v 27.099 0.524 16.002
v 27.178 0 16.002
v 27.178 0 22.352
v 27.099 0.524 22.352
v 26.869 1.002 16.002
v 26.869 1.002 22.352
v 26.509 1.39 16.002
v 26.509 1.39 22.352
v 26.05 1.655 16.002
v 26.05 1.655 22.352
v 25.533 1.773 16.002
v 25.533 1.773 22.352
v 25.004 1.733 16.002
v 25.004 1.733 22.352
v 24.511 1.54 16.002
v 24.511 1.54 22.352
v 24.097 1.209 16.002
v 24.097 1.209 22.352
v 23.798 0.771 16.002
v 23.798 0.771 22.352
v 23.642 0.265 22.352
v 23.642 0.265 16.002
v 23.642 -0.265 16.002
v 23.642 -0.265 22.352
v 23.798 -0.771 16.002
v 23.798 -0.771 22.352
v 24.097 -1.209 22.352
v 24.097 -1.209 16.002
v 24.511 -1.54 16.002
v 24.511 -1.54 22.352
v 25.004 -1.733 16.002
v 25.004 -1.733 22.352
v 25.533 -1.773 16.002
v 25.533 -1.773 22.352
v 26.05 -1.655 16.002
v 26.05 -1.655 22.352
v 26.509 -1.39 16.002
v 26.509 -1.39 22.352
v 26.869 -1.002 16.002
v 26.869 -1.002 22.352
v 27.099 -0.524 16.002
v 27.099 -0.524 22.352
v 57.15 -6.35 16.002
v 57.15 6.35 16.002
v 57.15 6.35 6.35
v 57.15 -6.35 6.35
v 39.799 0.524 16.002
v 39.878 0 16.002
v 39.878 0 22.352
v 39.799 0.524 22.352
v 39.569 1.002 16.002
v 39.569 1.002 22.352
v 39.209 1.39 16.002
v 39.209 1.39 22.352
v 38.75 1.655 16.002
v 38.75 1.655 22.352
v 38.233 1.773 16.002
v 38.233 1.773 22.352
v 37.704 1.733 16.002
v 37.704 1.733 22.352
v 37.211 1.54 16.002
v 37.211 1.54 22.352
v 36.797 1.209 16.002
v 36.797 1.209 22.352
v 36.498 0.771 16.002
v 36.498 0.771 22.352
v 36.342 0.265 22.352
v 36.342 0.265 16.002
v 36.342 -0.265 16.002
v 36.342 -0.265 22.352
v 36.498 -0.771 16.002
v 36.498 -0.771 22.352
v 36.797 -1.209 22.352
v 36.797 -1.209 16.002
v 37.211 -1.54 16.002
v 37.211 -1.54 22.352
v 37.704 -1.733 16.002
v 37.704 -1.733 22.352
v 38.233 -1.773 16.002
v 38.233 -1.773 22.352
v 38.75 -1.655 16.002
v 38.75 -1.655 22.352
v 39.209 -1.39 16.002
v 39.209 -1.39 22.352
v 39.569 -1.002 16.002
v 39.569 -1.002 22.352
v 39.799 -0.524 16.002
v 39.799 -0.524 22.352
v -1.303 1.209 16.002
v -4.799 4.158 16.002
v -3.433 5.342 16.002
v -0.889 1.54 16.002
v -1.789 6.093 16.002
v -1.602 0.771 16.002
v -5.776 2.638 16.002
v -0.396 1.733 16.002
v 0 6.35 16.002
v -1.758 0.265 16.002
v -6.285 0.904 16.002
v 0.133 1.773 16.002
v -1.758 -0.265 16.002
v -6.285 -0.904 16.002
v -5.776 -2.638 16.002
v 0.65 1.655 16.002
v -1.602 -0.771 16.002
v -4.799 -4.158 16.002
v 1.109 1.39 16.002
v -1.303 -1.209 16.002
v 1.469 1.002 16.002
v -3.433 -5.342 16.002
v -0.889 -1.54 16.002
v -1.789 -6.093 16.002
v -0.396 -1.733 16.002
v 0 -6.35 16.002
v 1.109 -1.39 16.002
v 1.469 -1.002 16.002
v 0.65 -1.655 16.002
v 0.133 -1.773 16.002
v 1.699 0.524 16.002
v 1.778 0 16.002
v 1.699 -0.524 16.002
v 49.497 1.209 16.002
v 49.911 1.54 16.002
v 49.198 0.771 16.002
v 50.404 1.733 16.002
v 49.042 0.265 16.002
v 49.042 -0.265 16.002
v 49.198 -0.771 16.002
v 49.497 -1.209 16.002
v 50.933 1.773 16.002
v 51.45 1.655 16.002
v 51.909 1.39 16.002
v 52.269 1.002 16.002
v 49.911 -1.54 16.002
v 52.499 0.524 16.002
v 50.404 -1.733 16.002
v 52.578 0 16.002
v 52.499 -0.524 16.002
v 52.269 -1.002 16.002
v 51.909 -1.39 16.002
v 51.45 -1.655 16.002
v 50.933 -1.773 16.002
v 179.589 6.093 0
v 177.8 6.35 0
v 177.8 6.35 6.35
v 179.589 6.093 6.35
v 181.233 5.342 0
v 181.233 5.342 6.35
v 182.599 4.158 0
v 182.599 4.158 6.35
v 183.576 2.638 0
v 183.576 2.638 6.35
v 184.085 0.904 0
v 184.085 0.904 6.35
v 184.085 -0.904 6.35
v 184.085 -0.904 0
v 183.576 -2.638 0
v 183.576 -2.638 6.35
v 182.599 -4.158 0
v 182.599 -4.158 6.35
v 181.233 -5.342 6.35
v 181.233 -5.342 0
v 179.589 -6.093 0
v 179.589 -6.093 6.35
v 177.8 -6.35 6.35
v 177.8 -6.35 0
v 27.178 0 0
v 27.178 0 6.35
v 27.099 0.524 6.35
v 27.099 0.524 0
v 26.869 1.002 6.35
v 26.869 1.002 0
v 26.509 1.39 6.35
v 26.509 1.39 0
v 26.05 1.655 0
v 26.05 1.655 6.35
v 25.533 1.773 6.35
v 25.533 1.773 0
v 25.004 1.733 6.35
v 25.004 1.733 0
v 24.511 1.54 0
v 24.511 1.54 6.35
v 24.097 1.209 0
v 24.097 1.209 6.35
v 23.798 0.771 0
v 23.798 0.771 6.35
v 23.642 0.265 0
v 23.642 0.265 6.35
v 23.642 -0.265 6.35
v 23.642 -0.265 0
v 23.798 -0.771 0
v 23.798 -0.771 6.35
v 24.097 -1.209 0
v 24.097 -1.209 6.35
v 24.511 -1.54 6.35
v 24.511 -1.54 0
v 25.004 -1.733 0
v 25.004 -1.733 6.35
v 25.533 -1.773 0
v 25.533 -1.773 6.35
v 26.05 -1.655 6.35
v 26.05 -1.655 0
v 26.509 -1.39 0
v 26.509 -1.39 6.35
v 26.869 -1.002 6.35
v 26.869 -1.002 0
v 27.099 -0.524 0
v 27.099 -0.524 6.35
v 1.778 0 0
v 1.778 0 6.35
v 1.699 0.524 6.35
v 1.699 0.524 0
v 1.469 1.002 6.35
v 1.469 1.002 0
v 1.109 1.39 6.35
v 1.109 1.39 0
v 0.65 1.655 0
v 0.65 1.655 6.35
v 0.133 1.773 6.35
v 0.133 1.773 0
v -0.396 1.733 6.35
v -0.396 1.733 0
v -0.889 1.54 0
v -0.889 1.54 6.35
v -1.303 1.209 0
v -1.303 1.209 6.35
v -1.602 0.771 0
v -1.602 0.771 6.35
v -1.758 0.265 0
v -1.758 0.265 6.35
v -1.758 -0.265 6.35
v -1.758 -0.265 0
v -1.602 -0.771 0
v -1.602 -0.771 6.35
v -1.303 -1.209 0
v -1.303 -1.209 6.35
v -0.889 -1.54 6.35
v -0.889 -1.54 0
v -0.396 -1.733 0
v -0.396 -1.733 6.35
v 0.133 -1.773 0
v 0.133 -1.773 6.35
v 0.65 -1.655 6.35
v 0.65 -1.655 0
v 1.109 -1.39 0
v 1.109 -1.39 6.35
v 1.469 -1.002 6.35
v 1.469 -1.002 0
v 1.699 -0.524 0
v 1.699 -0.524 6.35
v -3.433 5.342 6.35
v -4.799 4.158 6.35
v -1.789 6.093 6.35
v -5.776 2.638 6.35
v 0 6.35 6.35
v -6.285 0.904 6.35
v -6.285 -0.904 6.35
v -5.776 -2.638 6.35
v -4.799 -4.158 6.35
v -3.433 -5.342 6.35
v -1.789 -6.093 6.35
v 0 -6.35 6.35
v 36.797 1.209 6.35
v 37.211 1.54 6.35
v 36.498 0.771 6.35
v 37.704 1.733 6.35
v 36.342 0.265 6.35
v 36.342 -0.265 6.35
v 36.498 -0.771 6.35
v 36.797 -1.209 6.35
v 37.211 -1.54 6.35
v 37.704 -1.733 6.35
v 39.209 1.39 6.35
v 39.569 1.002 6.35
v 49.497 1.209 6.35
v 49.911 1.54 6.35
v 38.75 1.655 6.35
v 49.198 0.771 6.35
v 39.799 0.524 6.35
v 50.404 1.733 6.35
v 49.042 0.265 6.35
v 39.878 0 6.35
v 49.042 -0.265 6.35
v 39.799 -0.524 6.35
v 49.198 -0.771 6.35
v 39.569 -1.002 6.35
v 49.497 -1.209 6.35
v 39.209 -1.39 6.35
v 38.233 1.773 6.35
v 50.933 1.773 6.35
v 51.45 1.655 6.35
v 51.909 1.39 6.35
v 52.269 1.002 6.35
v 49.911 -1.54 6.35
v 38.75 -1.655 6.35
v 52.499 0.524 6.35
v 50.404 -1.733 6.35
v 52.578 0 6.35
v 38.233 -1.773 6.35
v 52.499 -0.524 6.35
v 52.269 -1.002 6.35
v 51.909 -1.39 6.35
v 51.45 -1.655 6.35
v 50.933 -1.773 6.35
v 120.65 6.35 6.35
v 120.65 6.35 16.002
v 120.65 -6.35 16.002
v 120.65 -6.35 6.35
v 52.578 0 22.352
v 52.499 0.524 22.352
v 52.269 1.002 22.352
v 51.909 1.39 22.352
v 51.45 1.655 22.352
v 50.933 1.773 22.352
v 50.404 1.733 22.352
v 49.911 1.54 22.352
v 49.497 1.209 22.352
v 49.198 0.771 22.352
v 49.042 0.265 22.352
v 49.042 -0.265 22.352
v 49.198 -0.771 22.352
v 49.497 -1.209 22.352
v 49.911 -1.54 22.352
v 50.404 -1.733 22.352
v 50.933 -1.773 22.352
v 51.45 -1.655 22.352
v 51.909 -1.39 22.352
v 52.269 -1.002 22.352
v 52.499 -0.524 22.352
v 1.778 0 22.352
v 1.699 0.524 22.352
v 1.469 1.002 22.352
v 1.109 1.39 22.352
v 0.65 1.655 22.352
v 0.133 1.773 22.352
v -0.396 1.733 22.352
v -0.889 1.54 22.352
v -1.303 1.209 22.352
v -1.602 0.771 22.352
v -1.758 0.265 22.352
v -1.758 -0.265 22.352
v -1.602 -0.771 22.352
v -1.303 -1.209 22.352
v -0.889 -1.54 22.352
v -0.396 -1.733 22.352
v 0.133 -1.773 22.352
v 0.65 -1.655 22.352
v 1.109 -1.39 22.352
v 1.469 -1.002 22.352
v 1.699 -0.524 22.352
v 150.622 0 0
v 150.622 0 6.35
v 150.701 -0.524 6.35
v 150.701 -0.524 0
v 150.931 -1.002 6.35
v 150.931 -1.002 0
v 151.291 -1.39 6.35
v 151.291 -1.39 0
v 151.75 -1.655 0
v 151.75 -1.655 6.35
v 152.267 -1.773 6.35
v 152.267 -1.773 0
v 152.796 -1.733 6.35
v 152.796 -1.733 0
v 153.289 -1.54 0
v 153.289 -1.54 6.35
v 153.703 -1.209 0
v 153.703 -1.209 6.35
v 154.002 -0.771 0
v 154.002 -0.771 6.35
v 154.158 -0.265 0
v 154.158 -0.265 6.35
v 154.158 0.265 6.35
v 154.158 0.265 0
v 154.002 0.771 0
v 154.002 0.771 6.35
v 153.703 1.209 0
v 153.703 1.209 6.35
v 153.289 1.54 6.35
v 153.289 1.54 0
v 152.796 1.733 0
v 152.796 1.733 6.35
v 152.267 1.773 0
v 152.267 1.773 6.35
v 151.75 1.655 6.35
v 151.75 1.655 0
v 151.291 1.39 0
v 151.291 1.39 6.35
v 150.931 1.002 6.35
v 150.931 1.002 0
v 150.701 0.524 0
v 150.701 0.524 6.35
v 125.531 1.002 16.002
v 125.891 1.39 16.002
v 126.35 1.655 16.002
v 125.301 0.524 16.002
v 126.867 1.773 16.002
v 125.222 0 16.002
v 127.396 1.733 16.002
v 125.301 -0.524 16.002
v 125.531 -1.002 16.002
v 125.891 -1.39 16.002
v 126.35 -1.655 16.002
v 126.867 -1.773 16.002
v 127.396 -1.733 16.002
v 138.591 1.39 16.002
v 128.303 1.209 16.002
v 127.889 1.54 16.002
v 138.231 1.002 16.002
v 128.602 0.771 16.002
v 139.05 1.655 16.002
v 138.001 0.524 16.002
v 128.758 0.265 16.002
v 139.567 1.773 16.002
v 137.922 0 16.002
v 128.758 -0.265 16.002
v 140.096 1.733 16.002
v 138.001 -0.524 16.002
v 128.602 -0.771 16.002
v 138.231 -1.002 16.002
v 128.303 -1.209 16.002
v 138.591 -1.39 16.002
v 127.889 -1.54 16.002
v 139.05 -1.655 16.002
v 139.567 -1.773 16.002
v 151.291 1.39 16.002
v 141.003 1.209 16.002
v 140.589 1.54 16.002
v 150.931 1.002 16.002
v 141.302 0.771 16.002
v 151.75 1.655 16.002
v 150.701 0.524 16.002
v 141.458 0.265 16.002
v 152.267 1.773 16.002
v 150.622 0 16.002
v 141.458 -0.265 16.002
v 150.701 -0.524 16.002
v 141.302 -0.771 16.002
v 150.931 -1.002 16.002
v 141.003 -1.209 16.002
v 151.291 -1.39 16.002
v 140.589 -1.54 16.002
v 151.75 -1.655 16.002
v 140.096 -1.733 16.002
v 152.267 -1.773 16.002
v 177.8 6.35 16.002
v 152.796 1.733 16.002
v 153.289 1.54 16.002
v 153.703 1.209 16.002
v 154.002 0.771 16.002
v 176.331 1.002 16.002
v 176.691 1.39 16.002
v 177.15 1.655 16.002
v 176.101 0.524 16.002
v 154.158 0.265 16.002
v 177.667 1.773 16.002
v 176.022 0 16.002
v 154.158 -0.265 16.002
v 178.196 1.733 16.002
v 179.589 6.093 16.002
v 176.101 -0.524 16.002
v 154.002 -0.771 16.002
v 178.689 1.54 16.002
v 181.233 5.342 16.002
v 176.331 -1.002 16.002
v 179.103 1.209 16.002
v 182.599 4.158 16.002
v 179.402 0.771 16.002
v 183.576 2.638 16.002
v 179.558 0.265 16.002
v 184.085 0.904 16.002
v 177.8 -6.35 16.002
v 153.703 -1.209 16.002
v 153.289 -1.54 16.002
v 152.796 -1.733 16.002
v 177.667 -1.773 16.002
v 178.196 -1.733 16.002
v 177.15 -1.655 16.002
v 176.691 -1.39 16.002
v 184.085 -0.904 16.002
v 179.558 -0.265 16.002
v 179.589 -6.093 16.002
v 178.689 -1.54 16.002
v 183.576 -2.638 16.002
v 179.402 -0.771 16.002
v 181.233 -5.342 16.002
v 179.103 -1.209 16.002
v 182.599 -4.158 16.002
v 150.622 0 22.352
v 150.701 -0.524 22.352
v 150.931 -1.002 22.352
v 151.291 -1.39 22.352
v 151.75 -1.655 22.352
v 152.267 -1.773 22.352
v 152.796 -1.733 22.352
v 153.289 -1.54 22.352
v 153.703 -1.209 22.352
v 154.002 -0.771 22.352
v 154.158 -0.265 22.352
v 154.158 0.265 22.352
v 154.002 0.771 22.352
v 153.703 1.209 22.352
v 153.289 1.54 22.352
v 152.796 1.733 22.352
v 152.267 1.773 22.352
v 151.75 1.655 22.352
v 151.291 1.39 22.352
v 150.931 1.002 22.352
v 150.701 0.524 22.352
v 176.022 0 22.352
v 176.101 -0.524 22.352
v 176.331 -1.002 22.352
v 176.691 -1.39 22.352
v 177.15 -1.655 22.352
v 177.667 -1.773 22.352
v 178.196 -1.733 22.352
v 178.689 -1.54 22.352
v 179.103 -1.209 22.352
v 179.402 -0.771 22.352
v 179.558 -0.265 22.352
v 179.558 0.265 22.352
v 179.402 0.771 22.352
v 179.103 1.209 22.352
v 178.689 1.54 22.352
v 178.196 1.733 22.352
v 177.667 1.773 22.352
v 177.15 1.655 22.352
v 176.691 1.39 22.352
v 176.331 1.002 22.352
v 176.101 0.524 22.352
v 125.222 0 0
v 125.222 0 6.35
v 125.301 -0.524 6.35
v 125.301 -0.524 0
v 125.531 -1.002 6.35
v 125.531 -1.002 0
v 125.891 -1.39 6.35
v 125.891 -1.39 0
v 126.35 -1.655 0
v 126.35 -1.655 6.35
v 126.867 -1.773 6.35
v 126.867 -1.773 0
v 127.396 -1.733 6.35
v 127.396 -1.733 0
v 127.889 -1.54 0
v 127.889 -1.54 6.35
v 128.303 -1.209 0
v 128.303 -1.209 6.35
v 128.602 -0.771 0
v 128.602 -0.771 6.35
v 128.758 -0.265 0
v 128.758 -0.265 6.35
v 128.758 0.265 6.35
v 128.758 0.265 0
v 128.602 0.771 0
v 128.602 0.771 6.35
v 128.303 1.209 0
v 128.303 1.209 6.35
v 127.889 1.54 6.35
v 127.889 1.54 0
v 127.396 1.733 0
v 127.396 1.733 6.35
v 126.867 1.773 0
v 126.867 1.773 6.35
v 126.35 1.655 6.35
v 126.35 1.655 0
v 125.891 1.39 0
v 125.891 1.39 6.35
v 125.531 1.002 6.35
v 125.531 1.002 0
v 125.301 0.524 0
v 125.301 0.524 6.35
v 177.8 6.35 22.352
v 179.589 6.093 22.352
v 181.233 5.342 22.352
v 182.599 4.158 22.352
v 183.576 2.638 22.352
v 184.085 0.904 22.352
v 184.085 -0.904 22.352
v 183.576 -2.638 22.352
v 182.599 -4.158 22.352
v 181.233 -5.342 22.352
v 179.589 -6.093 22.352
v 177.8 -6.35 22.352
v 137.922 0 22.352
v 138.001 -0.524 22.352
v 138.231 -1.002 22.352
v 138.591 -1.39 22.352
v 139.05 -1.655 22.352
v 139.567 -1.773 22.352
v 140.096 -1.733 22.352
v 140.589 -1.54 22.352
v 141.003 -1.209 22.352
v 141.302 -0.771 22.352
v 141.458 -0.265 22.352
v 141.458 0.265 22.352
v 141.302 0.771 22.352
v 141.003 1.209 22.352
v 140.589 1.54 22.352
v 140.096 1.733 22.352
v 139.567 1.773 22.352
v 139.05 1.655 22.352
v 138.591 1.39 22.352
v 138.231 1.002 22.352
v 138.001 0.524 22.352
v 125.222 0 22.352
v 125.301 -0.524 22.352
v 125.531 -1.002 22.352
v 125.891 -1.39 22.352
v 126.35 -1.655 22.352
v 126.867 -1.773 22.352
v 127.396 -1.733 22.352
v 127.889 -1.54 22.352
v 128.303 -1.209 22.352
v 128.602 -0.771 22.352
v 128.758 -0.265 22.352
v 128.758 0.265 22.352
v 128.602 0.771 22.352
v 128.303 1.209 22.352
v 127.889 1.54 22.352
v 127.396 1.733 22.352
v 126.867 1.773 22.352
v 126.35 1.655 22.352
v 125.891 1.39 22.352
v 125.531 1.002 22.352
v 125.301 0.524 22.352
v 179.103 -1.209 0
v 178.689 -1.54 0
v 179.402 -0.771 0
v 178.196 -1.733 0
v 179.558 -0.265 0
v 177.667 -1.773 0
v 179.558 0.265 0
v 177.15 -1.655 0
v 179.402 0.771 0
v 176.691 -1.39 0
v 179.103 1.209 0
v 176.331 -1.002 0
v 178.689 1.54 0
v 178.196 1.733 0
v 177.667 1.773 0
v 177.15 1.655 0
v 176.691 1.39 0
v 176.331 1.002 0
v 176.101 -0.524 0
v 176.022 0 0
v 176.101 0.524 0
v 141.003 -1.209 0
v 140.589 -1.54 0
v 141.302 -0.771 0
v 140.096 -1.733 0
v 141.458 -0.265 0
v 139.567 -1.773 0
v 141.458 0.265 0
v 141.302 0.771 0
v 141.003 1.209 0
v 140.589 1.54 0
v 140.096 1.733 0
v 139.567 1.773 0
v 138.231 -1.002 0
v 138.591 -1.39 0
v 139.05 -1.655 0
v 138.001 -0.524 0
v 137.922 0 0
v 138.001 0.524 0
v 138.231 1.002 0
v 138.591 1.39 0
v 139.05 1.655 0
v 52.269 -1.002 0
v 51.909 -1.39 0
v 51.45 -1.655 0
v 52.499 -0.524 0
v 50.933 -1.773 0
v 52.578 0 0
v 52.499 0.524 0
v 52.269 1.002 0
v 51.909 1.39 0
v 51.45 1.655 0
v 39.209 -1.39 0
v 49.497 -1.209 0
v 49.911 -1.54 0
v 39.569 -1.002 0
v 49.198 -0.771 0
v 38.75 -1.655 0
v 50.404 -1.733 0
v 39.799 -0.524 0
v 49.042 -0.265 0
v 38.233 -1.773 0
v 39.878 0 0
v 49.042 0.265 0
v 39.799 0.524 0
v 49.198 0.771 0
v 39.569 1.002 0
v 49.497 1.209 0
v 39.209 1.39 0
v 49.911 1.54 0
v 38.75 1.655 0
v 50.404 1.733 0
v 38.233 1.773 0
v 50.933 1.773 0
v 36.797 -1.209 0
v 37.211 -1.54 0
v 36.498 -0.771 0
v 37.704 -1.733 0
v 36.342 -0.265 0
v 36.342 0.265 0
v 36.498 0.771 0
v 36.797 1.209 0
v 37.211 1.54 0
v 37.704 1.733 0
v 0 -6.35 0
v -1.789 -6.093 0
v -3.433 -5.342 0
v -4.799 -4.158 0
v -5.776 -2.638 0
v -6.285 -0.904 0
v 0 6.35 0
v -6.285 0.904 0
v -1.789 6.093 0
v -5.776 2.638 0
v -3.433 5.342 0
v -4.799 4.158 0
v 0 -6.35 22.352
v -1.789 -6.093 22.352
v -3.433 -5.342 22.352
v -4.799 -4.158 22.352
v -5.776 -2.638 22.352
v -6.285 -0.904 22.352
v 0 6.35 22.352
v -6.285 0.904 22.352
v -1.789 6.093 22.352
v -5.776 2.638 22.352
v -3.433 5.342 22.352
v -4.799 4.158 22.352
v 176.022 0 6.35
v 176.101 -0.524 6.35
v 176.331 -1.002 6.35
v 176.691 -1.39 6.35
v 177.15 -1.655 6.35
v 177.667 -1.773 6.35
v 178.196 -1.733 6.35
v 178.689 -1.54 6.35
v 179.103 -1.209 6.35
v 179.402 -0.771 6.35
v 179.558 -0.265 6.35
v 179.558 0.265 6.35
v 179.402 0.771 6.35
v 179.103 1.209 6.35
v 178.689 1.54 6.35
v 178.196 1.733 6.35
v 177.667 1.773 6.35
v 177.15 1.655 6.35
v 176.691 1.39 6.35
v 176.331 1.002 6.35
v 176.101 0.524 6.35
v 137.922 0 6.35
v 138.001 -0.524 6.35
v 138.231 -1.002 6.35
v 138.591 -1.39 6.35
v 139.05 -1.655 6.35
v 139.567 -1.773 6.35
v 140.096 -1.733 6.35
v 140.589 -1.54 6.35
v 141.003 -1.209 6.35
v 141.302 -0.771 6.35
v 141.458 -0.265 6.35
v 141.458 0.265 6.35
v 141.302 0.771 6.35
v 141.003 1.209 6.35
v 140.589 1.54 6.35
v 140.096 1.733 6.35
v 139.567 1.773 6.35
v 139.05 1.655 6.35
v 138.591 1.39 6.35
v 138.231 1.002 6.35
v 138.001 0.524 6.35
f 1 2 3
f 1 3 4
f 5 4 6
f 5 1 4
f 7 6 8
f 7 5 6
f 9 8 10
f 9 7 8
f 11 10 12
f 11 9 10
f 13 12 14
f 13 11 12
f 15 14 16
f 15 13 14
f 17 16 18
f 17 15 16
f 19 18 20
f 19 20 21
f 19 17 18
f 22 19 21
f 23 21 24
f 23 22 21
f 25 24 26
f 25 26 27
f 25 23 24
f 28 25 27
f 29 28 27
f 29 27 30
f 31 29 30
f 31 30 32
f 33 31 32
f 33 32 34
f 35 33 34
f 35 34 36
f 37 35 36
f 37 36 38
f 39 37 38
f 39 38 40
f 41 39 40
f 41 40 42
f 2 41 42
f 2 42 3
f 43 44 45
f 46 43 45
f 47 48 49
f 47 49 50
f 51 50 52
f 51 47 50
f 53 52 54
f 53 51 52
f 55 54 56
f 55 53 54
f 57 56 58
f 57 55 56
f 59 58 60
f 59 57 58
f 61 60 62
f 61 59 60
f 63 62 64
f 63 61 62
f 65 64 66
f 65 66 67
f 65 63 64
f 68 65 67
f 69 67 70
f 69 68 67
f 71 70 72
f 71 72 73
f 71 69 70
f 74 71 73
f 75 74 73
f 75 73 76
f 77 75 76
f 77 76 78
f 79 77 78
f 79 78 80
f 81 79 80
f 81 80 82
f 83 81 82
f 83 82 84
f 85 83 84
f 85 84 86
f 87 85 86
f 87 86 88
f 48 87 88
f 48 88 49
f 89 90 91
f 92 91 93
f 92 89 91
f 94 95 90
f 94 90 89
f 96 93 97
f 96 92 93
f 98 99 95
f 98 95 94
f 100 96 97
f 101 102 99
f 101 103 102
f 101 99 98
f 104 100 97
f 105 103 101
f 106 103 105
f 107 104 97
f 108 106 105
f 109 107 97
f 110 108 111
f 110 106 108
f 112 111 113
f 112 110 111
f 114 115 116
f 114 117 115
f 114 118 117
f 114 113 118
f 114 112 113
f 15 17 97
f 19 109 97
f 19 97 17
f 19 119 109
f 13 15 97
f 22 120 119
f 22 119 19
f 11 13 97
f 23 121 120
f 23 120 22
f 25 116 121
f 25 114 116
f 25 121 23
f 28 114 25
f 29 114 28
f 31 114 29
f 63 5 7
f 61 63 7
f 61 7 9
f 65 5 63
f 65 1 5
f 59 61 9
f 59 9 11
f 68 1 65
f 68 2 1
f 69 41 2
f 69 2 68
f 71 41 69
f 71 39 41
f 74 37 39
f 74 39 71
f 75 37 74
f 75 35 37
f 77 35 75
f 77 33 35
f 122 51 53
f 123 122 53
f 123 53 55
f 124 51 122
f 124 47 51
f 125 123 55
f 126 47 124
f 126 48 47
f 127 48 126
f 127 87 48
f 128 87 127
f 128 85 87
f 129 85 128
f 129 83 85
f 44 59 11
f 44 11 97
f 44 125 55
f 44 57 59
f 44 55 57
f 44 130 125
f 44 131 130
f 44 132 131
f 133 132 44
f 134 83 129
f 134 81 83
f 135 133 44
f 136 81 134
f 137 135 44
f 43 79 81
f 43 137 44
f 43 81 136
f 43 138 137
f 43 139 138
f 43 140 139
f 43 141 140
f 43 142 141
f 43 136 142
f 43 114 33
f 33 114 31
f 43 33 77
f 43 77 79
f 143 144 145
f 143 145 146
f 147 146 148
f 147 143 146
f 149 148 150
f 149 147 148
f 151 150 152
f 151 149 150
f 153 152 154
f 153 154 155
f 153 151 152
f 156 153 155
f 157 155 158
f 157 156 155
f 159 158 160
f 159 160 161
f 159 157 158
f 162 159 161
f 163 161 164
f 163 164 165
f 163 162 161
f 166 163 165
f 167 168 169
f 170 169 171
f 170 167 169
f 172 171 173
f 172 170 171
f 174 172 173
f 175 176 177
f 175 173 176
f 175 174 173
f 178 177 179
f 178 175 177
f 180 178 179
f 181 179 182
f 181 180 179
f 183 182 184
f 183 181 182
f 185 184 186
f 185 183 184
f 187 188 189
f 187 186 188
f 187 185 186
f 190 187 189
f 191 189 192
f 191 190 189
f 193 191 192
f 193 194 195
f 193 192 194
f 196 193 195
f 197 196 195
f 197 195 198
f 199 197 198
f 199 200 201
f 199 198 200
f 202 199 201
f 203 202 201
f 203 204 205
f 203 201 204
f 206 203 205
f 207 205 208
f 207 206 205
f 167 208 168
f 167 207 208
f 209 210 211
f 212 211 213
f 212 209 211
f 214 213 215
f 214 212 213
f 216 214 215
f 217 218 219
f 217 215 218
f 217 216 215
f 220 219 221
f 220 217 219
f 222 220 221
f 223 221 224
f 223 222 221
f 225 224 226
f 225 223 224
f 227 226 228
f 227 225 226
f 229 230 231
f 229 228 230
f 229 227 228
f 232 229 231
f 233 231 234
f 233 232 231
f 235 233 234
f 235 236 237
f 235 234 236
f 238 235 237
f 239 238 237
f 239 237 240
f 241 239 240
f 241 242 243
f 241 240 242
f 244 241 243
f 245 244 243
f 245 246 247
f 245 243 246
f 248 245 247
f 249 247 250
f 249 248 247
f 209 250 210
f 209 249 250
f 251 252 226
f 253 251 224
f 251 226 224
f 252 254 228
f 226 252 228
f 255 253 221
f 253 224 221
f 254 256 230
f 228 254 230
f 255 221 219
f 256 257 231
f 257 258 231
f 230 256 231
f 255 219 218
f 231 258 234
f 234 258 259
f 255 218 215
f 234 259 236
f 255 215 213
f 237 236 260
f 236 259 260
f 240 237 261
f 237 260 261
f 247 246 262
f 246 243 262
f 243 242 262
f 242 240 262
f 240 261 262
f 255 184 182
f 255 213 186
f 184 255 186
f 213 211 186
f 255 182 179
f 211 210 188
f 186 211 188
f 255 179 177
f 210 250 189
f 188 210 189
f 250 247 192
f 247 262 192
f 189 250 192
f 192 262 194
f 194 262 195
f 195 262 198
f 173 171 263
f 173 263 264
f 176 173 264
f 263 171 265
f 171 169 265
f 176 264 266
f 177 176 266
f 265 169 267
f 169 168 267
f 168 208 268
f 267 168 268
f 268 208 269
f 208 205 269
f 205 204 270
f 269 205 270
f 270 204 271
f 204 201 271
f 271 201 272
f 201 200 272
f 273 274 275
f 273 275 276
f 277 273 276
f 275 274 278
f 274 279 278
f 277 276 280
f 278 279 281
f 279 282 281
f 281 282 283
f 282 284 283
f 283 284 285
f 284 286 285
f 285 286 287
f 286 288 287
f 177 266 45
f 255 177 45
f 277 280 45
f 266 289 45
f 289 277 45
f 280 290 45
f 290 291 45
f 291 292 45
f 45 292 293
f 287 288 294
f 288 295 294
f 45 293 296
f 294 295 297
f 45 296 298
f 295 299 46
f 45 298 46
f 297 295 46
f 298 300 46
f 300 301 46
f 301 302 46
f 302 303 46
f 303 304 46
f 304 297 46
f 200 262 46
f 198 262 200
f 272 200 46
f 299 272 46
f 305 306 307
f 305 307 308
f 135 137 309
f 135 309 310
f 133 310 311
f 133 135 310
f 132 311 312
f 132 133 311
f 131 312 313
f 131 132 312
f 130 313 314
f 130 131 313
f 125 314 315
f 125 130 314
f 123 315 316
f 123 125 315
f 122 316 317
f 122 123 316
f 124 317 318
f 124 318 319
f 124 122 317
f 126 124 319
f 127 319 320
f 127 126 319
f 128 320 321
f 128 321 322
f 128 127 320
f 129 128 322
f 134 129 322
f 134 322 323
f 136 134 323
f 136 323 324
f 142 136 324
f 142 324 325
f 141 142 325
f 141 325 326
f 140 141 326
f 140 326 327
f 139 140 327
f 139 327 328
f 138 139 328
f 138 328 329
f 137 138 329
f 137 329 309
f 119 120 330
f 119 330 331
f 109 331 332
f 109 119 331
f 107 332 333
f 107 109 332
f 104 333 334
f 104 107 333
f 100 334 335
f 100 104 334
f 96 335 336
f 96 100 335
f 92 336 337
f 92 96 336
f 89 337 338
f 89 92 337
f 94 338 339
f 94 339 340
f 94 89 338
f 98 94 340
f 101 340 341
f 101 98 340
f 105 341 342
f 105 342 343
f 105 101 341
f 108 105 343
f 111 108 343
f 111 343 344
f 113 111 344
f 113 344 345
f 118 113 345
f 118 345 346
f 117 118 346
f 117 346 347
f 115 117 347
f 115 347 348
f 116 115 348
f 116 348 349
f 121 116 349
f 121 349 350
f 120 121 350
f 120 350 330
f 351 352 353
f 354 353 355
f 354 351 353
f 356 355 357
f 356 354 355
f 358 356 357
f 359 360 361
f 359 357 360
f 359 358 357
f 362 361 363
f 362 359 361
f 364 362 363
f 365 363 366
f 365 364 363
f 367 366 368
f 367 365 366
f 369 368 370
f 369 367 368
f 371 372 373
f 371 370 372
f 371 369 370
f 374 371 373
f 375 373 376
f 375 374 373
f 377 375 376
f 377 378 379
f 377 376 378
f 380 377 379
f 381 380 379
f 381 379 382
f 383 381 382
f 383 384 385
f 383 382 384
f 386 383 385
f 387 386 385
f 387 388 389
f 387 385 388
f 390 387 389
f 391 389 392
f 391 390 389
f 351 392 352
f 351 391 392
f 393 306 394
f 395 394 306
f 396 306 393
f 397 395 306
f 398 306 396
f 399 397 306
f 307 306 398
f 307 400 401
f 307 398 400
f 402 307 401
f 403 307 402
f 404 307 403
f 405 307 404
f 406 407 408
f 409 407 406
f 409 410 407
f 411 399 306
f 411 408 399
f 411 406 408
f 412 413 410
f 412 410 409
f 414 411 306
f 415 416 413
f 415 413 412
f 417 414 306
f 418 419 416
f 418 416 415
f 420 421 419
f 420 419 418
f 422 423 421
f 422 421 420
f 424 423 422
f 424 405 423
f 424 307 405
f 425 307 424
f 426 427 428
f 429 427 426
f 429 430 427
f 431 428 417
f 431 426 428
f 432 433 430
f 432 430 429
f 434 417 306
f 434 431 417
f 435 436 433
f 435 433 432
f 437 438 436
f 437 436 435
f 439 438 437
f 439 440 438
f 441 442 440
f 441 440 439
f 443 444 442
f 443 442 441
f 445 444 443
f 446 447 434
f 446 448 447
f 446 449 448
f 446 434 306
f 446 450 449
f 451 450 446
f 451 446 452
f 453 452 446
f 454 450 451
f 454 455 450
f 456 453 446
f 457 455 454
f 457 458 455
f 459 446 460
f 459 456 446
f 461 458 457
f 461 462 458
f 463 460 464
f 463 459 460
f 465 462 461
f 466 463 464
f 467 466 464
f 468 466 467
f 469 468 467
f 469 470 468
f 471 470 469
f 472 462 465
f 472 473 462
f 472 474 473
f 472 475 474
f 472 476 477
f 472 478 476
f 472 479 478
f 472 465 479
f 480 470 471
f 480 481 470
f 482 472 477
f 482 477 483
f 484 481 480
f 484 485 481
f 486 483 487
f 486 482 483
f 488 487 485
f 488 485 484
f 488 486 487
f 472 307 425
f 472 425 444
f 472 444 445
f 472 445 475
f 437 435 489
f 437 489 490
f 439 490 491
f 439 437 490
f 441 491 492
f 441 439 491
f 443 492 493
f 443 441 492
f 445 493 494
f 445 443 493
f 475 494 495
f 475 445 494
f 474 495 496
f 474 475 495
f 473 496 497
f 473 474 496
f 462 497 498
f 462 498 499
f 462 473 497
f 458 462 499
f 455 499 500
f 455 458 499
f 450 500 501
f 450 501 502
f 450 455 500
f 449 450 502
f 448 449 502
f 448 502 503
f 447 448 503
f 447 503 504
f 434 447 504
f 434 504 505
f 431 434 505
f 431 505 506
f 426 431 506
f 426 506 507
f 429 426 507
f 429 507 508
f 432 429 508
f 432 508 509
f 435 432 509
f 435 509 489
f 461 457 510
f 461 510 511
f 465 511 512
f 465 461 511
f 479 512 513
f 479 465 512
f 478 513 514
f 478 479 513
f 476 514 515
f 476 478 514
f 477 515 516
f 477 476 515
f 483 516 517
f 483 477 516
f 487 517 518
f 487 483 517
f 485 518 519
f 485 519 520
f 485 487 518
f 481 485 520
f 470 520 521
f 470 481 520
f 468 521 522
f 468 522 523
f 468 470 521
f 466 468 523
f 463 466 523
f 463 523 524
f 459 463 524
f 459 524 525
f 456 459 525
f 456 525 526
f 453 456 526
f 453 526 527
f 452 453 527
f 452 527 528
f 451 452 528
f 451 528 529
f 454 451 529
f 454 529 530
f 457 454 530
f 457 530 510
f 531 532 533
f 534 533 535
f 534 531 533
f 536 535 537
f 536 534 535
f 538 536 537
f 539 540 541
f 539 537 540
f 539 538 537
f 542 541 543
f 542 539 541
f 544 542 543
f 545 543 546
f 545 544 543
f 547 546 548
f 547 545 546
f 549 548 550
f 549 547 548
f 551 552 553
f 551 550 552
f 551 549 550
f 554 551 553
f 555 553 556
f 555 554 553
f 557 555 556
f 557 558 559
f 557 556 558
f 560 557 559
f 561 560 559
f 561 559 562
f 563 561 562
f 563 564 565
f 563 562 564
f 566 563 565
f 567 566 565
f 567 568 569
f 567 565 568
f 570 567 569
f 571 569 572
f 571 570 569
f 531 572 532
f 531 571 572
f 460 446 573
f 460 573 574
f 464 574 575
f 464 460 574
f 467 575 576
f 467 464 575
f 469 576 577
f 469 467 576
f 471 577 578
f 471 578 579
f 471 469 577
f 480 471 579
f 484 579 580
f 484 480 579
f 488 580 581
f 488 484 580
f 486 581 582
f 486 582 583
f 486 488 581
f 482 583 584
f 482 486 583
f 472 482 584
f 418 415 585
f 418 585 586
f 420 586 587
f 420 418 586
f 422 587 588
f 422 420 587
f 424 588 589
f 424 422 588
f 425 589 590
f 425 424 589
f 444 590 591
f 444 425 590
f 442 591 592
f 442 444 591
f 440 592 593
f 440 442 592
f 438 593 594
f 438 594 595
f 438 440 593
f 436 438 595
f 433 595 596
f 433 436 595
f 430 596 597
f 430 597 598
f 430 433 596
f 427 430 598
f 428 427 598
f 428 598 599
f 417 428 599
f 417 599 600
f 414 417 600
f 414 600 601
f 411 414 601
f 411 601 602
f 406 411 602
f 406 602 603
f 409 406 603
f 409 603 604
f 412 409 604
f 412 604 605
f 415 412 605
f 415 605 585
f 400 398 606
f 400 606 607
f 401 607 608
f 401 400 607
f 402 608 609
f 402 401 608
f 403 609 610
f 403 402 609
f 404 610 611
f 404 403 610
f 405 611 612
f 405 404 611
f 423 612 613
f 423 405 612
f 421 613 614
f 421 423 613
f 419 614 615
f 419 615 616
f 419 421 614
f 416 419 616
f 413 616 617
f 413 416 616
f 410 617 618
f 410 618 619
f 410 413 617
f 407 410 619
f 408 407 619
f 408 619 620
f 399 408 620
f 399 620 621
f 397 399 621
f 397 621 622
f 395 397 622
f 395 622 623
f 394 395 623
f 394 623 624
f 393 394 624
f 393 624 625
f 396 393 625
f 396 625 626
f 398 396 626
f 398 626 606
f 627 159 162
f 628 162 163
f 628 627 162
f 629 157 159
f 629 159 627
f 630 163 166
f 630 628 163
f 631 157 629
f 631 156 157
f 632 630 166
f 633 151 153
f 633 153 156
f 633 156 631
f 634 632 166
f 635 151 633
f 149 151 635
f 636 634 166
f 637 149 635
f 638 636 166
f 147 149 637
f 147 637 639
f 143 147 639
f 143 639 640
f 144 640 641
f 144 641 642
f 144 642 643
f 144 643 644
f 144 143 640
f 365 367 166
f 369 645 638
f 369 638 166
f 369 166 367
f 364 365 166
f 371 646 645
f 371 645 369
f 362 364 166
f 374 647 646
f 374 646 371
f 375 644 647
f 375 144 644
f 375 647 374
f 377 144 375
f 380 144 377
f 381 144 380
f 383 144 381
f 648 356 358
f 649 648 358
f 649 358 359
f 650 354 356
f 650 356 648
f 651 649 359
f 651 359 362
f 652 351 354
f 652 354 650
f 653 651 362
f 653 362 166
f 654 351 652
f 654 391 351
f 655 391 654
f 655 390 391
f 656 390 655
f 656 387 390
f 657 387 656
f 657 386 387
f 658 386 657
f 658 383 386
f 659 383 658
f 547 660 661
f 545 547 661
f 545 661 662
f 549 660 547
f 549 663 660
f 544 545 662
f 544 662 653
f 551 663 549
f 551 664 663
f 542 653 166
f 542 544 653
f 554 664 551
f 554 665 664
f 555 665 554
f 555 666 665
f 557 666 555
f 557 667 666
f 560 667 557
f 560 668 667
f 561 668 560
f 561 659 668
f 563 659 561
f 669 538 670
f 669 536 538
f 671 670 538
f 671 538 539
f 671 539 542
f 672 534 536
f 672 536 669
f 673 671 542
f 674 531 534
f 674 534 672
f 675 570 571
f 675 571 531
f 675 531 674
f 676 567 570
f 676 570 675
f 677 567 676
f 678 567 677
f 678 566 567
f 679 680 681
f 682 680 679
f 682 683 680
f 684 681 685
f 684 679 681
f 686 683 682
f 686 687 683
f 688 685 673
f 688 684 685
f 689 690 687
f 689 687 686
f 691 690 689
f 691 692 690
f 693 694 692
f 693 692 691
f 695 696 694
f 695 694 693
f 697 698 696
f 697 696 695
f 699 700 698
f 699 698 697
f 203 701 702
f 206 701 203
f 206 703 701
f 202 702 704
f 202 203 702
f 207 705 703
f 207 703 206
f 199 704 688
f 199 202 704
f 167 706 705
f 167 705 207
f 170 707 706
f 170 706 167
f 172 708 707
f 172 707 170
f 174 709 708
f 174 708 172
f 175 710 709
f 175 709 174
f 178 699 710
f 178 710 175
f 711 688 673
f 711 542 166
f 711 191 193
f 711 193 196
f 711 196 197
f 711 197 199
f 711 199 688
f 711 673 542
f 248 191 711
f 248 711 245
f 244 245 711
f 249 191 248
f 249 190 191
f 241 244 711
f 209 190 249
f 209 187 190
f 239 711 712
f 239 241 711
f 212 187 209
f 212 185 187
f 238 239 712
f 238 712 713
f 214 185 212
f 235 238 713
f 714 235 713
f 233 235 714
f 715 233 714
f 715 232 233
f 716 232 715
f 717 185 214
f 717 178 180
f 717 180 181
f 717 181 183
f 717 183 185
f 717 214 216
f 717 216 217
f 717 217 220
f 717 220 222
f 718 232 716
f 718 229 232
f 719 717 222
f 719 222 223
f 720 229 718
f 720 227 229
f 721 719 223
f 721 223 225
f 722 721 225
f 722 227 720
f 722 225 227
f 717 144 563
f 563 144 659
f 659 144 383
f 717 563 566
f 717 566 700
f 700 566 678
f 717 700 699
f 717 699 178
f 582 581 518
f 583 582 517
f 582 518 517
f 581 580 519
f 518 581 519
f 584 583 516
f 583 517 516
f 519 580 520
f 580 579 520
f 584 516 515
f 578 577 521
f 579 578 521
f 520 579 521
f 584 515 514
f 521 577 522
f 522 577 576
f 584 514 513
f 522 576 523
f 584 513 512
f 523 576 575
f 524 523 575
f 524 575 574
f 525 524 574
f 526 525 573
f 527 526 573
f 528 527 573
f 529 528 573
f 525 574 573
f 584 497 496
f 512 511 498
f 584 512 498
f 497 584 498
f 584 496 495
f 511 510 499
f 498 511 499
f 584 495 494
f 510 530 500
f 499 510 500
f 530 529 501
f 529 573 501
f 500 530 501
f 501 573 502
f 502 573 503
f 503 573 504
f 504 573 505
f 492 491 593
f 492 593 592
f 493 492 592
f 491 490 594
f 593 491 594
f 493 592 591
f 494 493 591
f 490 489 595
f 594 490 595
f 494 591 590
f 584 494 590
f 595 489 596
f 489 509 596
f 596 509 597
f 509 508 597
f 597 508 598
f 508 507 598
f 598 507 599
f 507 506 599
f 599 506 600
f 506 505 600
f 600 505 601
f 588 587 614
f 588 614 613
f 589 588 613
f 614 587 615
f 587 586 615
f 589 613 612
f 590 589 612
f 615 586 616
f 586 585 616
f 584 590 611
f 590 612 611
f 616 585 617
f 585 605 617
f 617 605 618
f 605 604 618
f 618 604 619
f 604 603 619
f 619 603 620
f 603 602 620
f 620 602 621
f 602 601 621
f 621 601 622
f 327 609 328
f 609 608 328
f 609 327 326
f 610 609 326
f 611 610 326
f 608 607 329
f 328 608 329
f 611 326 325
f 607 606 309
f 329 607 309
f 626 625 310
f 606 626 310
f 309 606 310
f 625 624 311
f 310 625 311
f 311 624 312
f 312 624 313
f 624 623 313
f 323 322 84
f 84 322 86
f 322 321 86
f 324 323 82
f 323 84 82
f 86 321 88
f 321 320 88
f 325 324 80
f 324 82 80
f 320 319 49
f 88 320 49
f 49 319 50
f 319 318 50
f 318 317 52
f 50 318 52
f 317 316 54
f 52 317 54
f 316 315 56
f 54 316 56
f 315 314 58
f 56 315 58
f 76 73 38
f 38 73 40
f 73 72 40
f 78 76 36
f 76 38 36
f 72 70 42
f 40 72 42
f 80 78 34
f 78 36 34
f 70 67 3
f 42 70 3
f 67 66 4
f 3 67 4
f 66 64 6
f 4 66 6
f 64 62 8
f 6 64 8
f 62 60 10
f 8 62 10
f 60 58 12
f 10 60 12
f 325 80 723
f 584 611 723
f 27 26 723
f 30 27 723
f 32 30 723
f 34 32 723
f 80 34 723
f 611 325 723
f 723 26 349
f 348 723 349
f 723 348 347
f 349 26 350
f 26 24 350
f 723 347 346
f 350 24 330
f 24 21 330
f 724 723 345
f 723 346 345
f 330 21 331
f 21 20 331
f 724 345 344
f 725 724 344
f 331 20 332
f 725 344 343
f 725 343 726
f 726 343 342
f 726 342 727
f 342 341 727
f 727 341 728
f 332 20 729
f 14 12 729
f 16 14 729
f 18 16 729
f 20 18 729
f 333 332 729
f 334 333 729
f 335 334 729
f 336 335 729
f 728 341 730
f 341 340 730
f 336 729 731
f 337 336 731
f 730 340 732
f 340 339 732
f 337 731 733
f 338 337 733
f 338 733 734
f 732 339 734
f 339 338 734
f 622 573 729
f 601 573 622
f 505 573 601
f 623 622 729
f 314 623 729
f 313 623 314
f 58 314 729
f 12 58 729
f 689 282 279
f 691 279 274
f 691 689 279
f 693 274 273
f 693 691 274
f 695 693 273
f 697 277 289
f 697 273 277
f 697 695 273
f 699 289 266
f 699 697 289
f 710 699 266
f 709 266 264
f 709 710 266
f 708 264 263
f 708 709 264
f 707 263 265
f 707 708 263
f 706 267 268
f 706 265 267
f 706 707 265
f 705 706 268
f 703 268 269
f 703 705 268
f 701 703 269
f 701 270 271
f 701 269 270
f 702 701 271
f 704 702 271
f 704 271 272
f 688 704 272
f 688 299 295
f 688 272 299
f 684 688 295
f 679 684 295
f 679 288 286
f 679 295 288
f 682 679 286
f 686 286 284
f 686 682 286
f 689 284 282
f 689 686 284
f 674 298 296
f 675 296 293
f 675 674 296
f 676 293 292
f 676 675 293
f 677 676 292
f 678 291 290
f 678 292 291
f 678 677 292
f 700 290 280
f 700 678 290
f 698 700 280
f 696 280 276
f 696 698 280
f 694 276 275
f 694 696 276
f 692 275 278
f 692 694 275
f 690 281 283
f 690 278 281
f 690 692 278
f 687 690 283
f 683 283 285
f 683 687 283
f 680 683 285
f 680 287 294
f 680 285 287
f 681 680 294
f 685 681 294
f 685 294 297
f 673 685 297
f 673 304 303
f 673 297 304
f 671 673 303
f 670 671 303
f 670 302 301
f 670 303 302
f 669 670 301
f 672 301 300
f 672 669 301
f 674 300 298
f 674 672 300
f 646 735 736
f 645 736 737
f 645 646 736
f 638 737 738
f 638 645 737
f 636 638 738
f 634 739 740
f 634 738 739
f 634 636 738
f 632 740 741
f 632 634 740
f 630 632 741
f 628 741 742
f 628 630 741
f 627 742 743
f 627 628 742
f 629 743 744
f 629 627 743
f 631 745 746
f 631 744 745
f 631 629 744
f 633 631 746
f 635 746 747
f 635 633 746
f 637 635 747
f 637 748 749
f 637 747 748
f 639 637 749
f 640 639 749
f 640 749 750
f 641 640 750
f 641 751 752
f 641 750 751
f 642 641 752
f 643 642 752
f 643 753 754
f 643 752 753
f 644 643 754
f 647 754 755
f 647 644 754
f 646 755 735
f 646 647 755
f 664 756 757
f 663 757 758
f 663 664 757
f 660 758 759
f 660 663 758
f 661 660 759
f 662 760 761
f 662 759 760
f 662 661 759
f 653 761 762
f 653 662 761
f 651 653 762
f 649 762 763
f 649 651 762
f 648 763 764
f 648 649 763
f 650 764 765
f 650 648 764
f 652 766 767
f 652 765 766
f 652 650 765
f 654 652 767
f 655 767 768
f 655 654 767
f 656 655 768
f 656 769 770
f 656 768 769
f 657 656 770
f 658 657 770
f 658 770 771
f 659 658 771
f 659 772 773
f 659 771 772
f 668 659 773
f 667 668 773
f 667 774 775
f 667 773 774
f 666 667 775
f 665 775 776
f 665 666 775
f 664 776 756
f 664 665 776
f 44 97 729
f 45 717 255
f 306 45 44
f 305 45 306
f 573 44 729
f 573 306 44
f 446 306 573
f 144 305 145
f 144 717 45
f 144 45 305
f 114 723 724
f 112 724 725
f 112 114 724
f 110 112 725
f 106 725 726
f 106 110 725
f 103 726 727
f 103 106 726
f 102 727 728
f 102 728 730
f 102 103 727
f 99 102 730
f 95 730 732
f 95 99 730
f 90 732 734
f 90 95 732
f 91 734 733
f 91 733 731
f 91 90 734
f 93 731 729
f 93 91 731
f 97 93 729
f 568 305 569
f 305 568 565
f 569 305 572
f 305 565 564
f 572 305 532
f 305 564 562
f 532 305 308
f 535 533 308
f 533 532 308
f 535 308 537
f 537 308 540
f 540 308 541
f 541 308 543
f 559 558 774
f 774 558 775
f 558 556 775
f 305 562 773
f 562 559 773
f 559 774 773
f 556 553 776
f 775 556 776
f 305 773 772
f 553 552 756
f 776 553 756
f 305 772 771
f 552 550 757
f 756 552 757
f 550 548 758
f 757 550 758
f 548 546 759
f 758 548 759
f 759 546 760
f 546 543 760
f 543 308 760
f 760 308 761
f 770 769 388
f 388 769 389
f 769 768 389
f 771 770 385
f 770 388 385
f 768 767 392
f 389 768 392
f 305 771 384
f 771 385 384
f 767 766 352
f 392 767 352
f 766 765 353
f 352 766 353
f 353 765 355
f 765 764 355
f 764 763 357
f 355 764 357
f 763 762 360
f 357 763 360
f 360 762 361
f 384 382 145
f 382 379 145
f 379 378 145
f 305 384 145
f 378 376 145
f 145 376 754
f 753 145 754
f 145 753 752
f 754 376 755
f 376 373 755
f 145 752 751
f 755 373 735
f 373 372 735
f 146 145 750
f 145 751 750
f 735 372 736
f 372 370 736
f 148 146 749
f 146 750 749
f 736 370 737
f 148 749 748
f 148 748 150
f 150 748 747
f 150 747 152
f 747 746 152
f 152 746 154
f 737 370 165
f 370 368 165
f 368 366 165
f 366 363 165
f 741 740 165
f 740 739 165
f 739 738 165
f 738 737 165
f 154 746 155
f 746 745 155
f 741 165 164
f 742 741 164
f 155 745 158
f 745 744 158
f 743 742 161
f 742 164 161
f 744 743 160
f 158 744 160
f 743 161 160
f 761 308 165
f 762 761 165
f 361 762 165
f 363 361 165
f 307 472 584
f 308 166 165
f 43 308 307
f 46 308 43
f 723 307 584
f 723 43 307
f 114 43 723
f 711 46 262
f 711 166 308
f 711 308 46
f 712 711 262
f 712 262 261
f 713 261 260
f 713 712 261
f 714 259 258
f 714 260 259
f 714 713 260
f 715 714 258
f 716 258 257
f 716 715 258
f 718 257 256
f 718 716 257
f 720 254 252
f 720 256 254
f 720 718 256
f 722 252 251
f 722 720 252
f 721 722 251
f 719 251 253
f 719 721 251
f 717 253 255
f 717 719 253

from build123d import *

# Parameters (mm, degrees)
SKETCH2_R               = 1.778
BOSS_EXTRUDE1_DEPTH     = 22.352
CUT_EXTRUDE1_DEPTH      = 186.610228447
CUT_EXTRUDE1_DEPTH_BACK = 186.610228447
SKETCH3_W               = 63.5
SKETCH3_H               = 9.652


with BuildPart() as part:
    # Sketch2 → Boss-Extrude1 (new body)
    with BuildSketch(Plane.XY):
        with BuildLine():
            Line((0, 6.35), (177.8, 6.35))
            ThreePointArc((177.8, 6.35), (184.15, 0), (177.8, -6.35))
            Line((177.8, -6.35), (0, -6.35))
            ThreePointArc((0, -6.35), (-6.35, 0), (0, 6.35))
        make_face()
        Circle(SKETCH2_R, mode=Mode.SUBTRACT)
        with Locations((25.4, 0)):
            Circle(SKETCH2_R, mode=Mode.SUBTRACT)
        with Locations((38.1, 0)):
            Circle(SKETCH2_R, mode=Mode.SUBTRACT)
        with Locations((50.8, 0)):
            Circle(SKETCH2_R, mode=Mode.SUBTRACT)
        with Locations(Location((127, 0, 0), (0, 0, 180))):
            Circle(SKETCH2_R, mode=Mode.SUBTRACT)
        with Locations(Location((139.7, 0, 0), (0, 0, 180))):
            Circle(SKETCH2_R, mode=Mode.SUBTRACT)
        with Locations(Location((152.4, 0, 0), (0, 0, 180))):
            Circle(SKETCH2_R, mode=Mode.SUBTRACT)
        with Locations(Location((177.8, 0, 0), (0, 0, 180))):
            Circle(SKETCH2_R, mode=Mode.SUBTRACT)
    extrude(amount=BOSS_EXTRUDE1_DEPTH)

    # Sketch3 → Cut-Extrude1 (cut, two sides: drawn at the far end of the back side and taken through both)
    with BuildSketch(Plane(origin=(0, 0, 0), x_dir=(1, 0, 0), z_dir=(0, 1, 0)).offset(-CUT_EXTRUDE1_DEPTH_BACK)):
        with Locations((25.4, -11.176)):
            Rectangle(SKETCH3_W, SKETCH3_H)
        with Locations((152.4, -11.176)):
            Rectangle(SKETCH3_W, SKETCH3_H)
    extrude(amount=CUT_EXTRUDE1_DEPTH + CUT_EXTRUDE1_DEPTH_BACK, mode=Mode.SUBTRACT)


solid = part.part
